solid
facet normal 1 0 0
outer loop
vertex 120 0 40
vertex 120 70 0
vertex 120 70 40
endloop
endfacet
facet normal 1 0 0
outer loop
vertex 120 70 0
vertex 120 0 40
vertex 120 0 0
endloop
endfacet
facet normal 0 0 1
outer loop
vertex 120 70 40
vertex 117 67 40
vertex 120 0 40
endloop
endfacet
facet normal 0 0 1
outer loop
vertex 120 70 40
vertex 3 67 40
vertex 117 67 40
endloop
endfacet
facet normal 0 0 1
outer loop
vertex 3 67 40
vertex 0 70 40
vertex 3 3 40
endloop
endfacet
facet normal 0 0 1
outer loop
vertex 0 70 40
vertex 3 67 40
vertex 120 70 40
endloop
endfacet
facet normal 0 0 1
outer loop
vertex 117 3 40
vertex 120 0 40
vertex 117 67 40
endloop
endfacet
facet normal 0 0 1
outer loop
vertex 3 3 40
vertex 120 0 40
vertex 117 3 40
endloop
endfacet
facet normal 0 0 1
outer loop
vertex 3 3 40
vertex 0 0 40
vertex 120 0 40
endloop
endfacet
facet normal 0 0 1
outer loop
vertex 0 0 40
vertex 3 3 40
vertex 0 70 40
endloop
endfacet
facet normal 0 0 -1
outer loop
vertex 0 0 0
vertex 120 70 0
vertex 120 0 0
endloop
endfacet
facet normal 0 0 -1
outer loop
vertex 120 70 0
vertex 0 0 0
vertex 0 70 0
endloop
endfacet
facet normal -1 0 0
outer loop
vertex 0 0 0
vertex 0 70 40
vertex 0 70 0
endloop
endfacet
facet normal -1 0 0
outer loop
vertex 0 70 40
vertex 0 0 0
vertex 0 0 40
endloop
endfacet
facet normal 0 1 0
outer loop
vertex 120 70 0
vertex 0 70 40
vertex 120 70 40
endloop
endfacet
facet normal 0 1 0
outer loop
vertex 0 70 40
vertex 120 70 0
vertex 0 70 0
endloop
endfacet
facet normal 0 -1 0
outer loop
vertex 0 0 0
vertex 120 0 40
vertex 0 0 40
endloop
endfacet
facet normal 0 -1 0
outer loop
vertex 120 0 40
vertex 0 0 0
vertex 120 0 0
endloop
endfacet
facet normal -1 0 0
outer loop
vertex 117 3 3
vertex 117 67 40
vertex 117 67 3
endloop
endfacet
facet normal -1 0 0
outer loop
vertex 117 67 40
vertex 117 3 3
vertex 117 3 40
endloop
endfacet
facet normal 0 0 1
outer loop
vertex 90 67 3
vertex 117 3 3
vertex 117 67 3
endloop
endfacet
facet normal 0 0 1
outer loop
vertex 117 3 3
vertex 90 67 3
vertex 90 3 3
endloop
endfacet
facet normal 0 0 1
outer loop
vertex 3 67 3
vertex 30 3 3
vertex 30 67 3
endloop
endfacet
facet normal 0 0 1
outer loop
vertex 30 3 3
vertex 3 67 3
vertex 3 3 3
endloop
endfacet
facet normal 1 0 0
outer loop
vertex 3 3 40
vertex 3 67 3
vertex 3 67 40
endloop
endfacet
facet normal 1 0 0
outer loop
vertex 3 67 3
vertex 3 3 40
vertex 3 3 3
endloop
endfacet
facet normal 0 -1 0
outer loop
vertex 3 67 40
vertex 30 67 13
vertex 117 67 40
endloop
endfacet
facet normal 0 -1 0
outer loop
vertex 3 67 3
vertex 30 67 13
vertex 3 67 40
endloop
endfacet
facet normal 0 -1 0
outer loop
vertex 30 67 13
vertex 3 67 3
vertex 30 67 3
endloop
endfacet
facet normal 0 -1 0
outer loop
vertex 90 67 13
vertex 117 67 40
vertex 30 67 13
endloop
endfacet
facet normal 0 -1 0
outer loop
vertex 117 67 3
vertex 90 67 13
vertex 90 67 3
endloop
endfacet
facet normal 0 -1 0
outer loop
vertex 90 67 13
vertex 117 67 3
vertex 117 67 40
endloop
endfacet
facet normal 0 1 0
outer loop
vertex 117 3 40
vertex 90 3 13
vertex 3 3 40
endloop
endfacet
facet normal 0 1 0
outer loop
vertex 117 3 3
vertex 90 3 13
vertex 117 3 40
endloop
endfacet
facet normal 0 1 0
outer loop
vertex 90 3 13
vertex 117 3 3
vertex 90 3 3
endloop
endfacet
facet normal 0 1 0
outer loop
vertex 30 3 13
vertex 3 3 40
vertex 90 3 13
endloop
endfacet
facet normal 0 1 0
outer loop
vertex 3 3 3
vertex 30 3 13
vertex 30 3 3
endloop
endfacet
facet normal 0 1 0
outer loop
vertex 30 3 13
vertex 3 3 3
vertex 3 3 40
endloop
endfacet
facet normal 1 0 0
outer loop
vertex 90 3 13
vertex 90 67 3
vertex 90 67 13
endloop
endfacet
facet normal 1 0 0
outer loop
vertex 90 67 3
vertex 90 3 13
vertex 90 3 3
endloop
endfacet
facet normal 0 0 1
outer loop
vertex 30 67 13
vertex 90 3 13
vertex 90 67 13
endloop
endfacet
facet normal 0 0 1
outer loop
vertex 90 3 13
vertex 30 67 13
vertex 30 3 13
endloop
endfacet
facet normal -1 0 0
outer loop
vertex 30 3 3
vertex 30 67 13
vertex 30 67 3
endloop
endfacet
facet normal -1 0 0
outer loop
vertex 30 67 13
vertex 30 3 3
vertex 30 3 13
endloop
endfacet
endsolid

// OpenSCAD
// Buffer Tank for Mini Horizontal Gel Electrophoresis
// Units: millimetres

// Outer Dimensions
$outer_x = 120;
$outer_y = 70;
$outer_z = 40;

// Wall and Floor Thickness
$wall_thickness = 3;
$floor_thickness = 3;

// Platform Dimensions
$platform_length = 60; // X dimension
$platform_width = $outer_y - (2 * $wall_thickness); // Spans full inner width
$platform_height = 10; // Height above inner floor
$platform_top_z = $floor_thickness + $platform_height; // Absolute Z of top surface (should be 13)

// Hole Dimensions
$hole_diameter = 2;
$hole_y = 0; // Specified position
$hole_z = 30; // Absolute Z position
$hole_extension = 0.5; // Extension past the face for clean cutting

// Resolution for curved shapes
$fn = 64;

// Main Tank Body
// Constructed as a hollow box with a floor
difference() {
    // Outer Box
    cube([
        $outer_x, 
        $outer_y, 
        $outer_z
    ]);
    
    // Inner Void (Hollow space)
    // The void starts at z = $floor_thickness
    translate([
        $wall_thickness, 
        $wall_thickness, 
        $floor_thickness
    ]) {
        cube([
            $outer_x - (2 * $wall_thickness), 
            $outer_y - (2 * $wall_thickness), 
            $outer_z - $floor_thickness
        ]);
    }
}

// Raised Platform
// Positioned in the middle of the tank, spanning full inner width
// Base is at z = $floor_thickness (3), height is 10, so top is at 13.
translate([
    ($outer_x / 2) - ($platform_length / 2), 
    $wall_thickness, // Aligned with inner wall start
    $floor_thickness
]) {
    cube([
        $platform_length, 
        $platform_width, 
        $platform_height
    ]);
}

// Electrode Holes
// Two holes, one at each end (X = 0 and X = $outer_x), 
// along the Y axis at the specified Y and Z.
// Orientation: Horizontal along X axis.
// We use difference to cut these out of the existing solid.

// Helper to create a horizontal hole
module horizontal_hole(x_pos, y_pos, z_pos, length) {
    translate([x_pos, y_pos, z_pos]) {
        // Cylinder aligned with X axis
        rotate([0, 90, 0]) {
            cylinder(
                h = length,
                r = $hole_diameter / 2,
                $fn = $fn
            );
        }
    }
}

// Left End Hole
// Must extend past the wall at x=0. 
// Length = wall_thickness + (distance to hole center) + wall_thickness + extension
// Actually, simpler: The hole needs to go from x = -extension to x = $outer_x + extension? 
// No, the spec says "Through each end wall". 
// Hole 1: At x=0. Needs to go from x = -$wall_thickness to x = $wall_thickness (to clear the wall).
// But the tank is 120 wide. The hole is at the end.
// Let's define the cut length to ensure it clears the wall at x=0 and extends slightly into the tank.
// To be safe and clean, we cut a cylinder that spans from x = -$hole_extension to x = $outer_x + $hole_extension?
// No, that would make the bounding box 122 again.
// The cut must be contained within the tank's X bounds to keep the bounding box at 120.
// So for the left hole at x=0: Cut from x = -$wall_thickness to x = $wall_thickness? 
// Wait, the tank wall is at x=0 to x=3. The hole is "through the end wall".
// So the hole starts at x = -extension (outside) and ends at x = $wall_thickness + extension (inside).
// BUT, if we cut outside the tank, the bounding box grows.
// The prompt says "Through each end wall". In 3D printing, we usually cut the volume we have.
// If we cut a cylinder from x=-0.5 to x=3.5, the bounding box is still 0 to 120 because the tank is 0 to 120.
// The cylinder at x=-0.5 is just "cutting air" which is fine, but the bounding box calculation in the report showed 122.
// Why? Because the previous code used `h = 121` and centered it? No, it translated to 0 and 120.
// If I translate to 0 and use h=121, it goes to 121.
// To keep the bounding box at 120, the cut at x=0 must end at x=120? No.
// The cut at x=0 must end at x = $wall_thickness + extension.
// The cut at x=120 must start at x = $outer_x - $wall_thickness - extension.
// Let's calculate the length for the left hole:
// Start: x = -$hole_extension (to ensure clean cut through the wall face at 0)
// End: x = $wall_thickness + $hole_extension (to ensure clean cut through the inner face)
// Length = $wall_thickness + 2 * $hole_extension.
// Wait, the hole is "along X". It goes through the wall.
// The wall is 3mm thick. The hole is 2mm diameter.
// To cut through the wall at x=0, the cylinder must span from x < 0 to x > 3.
// To keep the bounding box at 120, the cylinder must not extend beyond x=0 or x=120 in the final union?
// Actually, if I cut a cylinder from x=-0.5 to x=3.5, the bounding box of the *difference* operation might still be 0-120 if the tank is 0-120.
// The previous error was likely `h = $outer_x + $hole_extension` which made the cylinder 121mm long.
// Correct approach: Cut a cylinder that is long enough to pass through the wall, but positioned such that it doesn't expand the bounding box beyond 120.
// Left Hole: Center at x=0. Length must cover x=-3 to x=3? No, just through the wall.
// Let's make the cylinder length = $wall_thickness + 2 * $hole_extension.
// Position: x = -$hole_extension.
// This covers x = -0.5 to x = 2.5. This cuts through the wall (0 to 3).
// Right Hole: Center
